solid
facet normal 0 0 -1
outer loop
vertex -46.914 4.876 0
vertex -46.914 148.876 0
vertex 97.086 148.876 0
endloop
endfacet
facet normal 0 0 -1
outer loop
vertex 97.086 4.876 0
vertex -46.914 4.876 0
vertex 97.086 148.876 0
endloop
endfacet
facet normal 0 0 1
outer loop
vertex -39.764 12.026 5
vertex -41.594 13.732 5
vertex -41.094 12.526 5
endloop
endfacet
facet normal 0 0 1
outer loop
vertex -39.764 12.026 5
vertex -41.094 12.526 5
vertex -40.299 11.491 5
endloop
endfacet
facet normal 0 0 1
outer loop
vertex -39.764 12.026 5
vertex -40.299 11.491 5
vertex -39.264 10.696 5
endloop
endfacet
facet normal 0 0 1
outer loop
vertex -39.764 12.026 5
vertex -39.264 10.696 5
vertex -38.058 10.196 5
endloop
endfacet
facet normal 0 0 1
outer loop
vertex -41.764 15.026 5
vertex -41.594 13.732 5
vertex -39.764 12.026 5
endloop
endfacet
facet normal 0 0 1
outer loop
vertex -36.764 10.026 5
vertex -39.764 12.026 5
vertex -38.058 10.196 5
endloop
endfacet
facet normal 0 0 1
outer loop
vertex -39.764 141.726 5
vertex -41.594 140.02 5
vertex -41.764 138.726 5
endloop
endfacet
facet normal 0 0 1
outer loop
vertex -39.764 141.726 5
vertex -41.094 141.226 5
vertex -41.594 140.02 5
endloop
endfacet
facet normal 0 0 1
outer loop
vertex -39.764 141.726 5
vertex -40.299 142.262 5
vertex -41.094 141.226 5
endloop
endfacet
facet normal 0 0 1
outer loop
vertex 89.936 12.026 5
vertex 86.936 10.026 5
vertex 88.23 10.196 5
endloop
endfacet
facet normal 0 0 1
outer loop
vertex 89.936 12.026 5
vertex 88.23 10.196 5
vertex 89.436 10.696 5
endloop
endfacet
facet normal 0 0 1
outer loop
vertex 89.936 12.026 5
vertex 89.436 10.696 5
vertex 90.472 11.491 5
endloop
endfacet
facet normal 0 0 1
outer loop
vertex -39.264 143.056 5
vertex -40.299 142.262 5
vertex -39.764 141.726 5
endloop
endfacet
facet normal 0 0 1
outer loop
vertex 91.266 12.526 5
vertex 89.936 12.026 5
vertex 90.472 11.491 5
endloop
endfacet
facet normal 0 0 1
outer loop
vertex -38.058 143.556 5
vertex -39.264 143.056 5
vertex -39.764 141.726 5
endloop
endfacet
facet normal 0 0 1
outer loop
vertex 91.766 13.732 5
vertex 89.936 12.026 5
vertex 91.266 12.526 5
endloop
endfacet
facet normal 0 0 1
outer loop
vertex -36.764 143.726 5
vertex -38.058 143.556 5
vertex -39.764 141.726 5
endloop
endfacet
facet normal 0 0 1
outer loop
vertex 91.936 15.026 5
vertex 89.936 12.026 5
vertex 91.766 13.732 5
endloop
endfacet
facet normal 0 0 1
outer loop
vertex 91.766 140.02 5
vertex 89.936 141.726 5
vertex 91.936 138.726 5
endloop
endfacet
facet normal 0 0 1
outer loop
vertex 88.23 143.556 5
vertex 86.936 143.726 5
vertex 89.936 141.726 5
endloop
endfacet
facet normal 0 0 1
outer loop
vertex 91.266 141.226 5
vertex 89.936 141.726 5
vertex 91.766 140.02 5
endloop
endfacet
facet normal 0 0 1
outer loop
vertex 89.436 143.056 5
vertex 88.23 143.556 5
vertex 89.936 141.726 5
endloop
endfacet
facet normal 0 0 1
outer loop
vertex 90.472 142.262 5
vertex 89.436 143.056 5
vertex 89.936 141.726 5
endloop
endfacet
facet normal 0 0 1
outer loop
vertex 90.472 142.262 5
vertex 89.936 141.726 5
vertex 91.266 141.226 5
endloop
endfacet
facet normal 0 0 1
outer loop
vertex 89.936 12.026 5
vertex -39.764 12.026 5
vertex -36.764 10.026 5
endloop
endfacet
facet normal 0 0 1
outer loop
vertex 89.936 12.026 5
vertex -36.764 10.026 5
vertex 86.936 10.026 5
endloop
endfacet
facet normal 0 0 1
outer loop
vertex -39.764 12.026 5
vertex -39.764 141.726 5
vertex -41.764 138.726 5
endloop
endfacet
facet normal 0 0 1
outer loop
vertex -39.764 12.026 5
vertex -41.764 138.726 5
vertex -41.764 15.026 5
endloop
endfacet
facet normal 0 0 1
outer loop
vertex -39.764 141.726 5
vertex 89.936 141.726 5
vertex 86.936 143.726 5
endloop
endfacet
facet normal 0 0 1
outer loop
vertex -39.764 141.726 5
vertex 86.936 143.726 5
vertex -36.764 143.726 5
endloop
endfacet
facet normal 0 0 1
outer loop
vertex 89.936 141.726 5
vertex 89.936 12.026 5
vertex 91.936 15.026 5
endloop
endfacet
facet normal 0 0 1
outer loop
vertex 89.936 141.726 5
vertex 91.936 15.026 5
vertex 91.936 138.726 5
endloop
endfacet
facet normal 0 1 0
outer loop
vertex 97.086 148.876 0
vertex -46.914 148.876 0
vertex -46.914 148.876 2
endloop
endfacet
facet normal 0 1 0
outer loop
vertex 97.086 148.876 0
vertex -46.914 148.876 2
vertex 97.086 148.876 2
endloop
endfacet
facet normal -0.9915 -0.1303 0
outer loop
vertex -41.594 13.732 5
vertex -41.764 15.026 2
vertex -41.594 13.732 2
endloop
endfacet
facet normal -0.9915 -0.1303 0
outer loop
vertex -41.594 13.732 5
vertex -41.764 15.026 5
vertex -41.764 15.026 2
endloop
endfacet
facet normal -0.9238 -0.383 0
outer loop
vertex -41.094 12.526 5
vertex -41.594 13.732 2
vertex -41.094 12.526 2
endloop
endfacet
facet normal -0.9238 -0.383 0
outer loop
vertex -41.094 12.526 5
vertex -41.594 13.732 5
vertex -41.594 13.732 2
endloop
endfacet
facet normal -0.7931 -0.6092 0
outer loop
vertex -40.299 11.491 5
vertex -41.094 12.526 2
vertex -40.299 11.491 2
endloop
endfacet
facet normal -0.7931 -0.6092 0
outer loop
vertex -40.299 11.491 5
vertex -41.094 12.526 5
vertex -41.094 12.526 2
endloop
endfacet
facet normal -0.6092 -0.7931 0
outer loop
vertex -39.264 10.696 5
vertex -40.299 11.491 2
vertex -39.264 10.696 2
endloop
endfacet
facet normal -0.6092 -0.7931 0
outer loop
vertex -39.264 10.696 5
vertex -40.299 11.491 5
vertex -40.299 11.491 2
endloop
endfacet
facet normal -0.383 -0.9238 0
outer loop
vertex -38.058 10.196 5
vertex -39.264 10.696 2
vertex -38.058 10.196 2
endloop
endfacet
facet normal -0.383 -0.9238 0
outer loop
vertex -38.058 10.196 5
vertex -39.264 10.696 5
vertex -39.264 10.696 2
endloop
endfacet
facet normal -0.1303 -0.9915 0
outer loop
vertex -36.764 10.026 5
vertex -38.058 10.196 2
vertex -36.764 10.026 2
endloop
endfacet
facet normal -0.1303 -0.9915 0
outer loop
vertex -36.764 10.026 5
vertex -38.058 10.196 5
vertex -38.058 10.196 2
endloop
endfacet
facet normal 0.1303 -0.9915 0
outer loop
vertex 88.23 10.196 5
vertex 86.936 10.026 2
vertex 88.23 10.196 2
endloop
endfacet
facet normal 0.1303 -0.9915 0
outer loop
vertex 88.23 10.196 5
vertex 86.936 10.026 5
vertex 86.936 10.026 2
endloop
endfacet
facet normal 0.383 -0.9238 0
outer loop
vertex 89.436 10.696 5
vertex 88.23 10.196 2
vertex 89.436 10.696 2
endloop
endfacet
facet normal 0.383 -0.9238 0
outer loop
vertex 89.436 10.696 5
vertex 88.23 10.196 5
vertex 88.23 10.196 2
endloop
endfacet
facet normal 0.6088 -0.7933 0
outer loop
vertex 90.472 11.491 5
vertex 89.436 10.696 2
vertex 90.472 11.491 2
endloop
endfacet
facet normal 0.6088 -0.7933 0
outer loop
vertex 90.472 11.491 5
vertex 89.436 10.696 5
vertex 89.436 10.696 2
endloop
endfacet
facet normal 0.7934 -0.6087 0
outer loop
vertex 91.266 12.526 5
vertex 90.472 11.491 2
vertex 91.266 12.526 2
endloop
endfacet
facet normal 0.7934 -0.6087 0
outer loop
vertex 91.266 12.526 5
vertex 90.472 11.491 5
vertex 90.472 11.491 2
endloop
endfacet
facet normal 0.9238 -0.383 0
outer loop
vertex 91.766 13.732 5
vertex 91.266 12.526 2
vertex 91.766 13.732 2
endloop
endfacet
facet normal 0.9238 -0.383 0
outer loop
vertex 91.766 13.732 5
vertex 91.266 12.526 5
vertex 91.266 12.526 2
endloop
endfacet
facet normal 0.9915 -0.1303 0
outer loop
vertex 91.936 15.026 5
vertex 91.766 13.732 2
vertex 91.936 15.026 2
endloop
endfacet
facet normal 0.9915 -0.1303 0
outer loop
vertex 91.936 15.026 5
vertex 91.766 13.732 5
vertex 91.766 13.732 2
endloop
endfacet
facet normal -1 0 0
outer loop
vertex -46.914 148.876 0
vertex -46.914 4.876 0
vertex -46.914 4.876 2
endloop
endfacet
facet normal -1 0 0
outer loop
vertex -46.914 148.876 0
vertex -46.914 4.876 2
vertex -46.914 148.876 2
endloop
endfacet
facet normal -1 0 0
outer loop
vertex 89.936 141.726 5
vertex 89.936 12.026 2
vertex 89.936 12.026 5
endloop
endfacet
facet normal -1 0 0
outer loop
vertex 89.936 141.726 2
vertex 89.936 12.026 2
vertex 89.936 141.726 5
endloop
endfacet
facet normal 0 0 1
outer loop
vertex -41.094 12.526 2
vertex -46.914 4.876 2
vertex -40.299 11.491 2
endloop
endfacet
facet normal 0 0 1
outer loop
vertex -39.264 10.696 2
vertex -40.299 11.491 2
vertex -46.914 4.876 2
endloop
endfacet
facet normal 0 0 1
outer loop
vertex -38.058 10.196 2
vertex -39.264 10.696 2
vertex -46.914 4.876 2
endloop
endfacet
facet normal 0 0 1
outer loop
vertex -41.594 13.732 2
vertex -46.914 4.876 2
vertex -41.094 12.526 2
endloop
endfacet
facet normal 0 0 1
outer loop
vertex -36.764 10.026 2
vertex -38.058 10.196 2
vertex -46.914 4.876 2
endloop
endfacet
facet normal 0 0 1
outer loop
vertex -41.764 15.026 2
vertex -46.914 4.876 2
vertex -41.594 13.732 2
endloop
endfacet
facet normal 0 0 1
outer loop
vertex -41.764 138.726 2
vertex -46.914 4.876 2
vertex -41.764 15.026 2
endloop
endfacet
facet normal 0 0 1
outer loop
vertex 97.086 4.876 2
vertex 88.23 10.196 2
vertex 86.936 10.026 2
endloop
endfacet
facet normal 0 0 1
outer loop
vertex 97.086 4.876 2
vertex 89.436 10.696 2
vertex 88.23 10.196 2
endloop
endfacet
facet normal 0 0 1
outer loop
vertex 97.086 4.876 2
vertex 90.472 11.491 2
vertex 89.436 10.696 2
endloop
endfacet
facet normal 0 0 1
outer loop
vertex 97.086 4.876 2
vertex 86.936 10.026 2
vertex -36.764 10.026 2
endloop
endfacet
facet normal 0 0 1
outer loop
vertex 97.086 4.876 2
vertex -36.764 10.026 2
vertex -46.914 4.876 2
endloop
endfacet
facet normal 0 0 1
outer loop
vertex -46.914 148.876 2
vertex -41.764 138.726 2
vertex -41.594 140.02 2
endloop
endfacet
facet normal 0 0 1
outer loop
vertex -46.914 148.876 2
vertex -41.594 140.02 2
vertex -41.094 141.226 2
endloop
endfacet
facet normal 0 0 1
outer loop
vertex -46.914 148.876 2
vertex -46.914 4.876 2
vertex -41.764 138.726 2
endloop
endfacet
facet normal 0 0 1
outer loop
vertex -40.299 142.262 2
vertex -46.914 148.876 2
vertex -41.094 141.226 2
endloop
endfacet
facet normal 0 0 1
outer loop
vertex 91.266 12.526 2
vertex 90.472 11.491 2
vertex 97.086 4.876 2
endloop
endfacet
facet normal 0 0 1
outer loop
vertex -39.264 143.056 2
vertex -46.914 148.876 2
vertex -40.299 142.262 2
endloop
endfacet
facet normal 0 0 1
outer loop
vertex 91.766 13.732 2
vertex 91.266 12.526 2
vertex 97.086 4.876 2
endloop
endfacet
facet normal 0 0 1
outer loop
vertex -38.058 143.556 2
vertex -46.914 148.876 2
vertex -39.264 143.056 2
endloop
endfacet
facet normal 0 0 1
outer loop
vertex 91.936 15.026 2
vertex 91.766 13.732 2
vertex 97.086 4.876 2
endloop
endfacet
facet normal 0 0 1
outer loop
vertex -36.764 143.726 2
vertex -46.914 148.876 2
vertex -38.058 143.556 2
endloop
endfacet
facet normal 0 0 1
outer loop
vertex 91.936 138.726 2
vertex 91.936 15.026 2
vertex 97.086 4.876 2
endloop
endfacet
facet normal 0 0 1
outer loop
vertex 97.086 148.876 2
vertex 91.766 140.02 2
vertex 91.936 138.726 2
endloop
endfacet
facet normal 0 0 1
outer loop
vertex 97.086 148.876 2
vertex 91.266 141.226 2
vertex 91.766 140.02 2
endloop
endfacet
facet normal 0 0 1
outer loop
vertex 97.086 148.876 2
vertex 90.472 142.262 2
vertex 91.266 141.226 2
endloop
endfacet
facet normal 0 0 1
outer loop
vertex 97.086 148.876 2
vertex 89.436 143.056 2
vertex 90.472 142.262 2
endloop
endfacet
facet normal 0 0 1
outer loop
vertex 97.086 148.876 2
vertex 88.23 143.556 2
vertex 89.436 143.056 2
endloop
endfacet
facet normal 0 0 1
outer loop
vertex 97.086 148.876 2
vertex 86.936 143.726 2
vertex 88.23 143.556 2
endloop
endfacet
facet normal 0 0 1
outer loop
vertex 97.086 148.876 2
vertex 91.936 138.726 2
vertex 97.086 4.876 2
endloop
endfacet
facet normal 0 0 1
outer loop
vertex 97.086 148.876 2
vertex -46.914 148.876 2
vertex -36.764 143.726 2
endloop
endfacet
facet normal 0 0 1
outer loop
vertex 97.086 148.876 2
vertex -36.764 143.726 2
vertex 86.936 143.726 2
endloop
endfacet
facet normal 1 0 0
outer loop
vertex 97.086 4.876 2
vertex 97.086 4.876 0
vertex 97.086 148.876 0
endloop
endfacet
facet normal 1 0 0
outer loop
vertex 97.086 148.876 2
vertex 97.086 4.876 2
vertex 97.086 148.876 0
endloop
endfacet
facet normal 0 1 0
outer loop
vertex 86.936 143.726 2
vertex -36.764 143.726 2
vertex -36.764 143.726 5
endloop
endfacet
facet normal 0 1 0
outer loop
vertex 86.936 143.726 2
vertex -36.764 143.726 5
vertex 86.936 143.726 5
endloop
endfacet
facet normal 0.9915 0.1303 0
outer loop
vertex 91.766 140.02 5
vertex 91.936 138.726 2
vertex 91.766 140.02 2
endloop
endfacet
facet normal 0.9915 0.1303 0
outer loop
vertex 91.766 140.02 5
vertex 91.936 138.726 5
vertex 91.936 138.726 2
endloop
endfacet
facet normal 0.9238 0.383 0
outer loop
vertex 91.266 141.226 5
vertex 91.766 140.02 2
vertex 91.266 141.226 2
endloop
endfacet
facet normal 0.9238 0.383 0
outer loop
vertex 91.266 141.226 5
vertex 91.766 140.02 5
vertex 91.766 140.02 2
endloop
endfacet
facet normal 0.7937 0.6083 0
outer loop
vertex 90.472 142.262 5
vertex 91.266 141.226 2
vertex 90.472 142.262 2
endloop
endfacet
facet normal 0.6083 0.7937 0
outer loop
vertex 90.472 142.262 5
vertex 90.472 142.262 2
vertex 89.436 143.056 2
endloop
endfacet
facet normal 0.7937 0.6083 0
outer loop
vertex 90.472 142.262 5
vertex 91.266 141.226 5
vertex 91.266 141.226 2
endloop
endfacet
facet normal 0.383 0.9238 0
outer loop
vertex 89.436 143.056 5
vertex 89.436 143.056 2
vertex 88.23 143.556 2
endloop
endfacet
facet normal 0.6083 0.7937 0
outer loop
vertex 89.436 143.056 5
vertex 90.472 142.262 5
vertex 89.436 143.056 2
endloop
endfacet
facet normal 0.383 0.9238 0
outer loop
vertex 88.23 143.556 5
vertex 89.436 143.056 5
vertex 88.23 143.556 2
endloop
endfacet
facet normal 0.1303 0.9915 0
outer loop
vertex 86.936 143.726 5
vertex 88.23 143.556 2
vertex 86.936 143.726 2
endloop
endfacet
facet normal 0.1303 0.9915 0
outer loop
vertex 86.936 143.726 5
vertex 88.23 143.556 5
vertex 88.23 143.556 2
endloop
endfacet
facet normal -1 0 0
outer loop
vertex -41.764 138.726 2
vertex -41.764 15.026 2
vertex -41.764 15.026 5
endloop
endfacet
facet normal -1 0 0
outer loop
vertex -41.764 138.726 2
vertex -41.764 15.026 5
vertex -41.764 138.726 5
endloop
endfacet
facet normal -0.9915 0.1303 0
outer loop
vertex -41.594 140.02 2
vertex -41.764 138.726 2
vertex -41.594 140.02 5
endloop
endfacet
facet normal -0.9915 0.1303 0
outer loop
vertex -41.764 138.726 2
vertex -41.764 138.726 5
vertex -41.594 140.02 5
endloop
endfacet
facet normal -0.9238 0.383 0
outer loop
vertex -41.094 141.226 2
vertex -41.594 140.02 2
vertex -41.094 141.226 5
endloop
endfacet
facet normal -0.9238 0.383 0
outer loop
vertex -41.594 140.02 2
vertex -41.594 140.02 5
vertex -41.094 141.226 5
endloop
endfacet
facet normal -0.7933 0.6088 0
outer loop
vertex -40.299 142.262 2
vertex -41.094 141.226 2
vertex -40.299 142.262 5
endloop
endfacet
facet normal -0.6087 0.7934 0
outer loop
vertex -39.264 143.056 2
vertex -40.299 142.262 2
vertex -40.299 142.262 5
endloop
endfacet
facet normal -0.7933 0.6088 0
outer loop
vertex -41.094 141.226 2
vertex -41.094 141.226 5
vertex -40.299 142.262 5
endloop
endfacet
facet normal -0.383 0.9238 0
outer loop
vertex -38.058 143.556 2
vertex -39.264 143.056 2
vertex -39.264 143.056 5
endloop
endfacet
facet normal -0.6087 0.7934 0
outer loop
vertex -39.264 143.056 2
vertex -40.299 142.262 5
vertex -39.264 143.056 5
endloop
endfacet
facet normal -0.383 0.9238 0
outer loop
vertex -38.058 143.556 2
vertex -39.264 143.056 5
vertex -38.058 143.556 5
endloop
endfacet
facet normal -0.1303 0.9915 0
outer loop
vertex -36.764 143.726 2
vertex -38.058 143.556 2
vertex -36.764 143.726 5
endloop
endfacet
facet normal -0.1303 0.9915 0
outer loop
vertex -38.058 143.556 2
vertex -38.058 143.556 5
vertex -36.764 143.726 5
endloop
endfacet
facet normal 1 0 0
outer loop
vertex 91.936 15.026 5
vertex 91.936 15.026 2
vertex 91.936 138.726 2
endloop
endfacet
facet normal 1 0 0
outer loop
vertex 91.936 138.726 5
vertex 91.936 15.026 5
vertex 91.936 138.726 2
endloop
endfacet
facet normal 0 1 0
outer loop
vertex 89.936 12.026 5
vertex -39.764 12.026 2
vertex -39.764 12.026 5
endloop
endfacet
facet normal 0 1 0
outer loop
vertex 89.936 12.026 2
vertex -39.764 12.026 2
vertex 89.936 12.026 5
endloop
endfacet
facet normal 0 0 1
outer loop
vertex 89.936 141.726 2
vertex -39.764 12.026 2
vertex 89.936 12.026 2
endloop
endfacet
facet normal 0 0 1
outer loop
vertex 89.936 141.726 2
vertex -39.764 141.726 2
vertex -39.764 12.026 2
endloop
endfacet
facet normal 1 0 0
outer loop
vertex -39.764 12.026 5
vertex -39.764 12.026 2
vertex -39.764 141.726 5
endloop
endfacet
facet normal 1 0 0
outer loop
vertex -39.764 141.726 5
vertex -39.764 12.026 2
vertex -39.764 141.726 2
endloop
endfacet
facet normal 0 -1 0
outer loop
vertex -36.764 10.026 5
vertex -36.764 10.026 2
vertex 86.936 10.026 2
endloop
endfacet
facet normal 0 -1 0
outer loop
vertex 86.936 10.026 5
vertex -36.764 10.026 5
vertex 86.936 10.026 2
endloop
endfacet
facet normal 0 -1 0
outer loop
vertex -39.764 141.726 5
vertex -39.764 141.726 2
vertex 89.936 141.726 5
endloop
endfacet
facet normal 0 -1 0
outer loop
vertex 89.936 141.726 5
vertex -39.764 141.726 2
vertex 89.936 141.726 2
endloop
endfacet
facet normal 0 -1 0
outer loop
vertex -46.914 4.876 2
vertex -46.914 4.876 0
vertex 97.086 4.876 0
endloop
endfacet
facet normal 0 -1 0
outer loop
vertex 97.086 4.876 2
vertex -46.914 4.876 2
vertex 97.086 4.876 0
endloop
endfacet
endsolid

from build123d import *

# Parameters (mm, degrees)
F0_W     = 144
F0_H     = 144
F2_DEPTH = 2
F1_W     = 133.7
F1_H     = 133.7
F1_W_2   = 129.7
F1_H_2   = 129.7
F3_DEPTH = 5
F4_R     = 5


with BuildPart() as f2:
    # F0 (on Top) → F2 (new body)
    with BuildSketch(Plane.XY):
        with Locations((25.086074, 76.876128)):
            Rectangle(F0_W, F0_H)
    extrude(amount=F2_DEPTH)

    # F1 (on face) → F3 (join)
    with BuildSketch(Plane.XY):
        with Locations((25.086074, 76.876128)):
            Rectangle(F1_W, F1_H)
        with Locations((25.086074, 76.876128)):
            Rectangle(F1_W_2, F1_H_2, mode=Mode.SUBTRACT)
    extrude(amount=F3_DEPTH)

    # F4
    f4_edges = [f2.edges().sort_by_distance(p)[0] for p in [
        (-41.763926, 143.726128, 3.5),
        (91.936074, 143.726128, 3.5),
        (-41.763926, 10.026128, 3.5),
        (91.936074, 10.026128, 3.5),
    ]]
    fillet(f4_edges, radius=F4_R)


solid = f2.part
